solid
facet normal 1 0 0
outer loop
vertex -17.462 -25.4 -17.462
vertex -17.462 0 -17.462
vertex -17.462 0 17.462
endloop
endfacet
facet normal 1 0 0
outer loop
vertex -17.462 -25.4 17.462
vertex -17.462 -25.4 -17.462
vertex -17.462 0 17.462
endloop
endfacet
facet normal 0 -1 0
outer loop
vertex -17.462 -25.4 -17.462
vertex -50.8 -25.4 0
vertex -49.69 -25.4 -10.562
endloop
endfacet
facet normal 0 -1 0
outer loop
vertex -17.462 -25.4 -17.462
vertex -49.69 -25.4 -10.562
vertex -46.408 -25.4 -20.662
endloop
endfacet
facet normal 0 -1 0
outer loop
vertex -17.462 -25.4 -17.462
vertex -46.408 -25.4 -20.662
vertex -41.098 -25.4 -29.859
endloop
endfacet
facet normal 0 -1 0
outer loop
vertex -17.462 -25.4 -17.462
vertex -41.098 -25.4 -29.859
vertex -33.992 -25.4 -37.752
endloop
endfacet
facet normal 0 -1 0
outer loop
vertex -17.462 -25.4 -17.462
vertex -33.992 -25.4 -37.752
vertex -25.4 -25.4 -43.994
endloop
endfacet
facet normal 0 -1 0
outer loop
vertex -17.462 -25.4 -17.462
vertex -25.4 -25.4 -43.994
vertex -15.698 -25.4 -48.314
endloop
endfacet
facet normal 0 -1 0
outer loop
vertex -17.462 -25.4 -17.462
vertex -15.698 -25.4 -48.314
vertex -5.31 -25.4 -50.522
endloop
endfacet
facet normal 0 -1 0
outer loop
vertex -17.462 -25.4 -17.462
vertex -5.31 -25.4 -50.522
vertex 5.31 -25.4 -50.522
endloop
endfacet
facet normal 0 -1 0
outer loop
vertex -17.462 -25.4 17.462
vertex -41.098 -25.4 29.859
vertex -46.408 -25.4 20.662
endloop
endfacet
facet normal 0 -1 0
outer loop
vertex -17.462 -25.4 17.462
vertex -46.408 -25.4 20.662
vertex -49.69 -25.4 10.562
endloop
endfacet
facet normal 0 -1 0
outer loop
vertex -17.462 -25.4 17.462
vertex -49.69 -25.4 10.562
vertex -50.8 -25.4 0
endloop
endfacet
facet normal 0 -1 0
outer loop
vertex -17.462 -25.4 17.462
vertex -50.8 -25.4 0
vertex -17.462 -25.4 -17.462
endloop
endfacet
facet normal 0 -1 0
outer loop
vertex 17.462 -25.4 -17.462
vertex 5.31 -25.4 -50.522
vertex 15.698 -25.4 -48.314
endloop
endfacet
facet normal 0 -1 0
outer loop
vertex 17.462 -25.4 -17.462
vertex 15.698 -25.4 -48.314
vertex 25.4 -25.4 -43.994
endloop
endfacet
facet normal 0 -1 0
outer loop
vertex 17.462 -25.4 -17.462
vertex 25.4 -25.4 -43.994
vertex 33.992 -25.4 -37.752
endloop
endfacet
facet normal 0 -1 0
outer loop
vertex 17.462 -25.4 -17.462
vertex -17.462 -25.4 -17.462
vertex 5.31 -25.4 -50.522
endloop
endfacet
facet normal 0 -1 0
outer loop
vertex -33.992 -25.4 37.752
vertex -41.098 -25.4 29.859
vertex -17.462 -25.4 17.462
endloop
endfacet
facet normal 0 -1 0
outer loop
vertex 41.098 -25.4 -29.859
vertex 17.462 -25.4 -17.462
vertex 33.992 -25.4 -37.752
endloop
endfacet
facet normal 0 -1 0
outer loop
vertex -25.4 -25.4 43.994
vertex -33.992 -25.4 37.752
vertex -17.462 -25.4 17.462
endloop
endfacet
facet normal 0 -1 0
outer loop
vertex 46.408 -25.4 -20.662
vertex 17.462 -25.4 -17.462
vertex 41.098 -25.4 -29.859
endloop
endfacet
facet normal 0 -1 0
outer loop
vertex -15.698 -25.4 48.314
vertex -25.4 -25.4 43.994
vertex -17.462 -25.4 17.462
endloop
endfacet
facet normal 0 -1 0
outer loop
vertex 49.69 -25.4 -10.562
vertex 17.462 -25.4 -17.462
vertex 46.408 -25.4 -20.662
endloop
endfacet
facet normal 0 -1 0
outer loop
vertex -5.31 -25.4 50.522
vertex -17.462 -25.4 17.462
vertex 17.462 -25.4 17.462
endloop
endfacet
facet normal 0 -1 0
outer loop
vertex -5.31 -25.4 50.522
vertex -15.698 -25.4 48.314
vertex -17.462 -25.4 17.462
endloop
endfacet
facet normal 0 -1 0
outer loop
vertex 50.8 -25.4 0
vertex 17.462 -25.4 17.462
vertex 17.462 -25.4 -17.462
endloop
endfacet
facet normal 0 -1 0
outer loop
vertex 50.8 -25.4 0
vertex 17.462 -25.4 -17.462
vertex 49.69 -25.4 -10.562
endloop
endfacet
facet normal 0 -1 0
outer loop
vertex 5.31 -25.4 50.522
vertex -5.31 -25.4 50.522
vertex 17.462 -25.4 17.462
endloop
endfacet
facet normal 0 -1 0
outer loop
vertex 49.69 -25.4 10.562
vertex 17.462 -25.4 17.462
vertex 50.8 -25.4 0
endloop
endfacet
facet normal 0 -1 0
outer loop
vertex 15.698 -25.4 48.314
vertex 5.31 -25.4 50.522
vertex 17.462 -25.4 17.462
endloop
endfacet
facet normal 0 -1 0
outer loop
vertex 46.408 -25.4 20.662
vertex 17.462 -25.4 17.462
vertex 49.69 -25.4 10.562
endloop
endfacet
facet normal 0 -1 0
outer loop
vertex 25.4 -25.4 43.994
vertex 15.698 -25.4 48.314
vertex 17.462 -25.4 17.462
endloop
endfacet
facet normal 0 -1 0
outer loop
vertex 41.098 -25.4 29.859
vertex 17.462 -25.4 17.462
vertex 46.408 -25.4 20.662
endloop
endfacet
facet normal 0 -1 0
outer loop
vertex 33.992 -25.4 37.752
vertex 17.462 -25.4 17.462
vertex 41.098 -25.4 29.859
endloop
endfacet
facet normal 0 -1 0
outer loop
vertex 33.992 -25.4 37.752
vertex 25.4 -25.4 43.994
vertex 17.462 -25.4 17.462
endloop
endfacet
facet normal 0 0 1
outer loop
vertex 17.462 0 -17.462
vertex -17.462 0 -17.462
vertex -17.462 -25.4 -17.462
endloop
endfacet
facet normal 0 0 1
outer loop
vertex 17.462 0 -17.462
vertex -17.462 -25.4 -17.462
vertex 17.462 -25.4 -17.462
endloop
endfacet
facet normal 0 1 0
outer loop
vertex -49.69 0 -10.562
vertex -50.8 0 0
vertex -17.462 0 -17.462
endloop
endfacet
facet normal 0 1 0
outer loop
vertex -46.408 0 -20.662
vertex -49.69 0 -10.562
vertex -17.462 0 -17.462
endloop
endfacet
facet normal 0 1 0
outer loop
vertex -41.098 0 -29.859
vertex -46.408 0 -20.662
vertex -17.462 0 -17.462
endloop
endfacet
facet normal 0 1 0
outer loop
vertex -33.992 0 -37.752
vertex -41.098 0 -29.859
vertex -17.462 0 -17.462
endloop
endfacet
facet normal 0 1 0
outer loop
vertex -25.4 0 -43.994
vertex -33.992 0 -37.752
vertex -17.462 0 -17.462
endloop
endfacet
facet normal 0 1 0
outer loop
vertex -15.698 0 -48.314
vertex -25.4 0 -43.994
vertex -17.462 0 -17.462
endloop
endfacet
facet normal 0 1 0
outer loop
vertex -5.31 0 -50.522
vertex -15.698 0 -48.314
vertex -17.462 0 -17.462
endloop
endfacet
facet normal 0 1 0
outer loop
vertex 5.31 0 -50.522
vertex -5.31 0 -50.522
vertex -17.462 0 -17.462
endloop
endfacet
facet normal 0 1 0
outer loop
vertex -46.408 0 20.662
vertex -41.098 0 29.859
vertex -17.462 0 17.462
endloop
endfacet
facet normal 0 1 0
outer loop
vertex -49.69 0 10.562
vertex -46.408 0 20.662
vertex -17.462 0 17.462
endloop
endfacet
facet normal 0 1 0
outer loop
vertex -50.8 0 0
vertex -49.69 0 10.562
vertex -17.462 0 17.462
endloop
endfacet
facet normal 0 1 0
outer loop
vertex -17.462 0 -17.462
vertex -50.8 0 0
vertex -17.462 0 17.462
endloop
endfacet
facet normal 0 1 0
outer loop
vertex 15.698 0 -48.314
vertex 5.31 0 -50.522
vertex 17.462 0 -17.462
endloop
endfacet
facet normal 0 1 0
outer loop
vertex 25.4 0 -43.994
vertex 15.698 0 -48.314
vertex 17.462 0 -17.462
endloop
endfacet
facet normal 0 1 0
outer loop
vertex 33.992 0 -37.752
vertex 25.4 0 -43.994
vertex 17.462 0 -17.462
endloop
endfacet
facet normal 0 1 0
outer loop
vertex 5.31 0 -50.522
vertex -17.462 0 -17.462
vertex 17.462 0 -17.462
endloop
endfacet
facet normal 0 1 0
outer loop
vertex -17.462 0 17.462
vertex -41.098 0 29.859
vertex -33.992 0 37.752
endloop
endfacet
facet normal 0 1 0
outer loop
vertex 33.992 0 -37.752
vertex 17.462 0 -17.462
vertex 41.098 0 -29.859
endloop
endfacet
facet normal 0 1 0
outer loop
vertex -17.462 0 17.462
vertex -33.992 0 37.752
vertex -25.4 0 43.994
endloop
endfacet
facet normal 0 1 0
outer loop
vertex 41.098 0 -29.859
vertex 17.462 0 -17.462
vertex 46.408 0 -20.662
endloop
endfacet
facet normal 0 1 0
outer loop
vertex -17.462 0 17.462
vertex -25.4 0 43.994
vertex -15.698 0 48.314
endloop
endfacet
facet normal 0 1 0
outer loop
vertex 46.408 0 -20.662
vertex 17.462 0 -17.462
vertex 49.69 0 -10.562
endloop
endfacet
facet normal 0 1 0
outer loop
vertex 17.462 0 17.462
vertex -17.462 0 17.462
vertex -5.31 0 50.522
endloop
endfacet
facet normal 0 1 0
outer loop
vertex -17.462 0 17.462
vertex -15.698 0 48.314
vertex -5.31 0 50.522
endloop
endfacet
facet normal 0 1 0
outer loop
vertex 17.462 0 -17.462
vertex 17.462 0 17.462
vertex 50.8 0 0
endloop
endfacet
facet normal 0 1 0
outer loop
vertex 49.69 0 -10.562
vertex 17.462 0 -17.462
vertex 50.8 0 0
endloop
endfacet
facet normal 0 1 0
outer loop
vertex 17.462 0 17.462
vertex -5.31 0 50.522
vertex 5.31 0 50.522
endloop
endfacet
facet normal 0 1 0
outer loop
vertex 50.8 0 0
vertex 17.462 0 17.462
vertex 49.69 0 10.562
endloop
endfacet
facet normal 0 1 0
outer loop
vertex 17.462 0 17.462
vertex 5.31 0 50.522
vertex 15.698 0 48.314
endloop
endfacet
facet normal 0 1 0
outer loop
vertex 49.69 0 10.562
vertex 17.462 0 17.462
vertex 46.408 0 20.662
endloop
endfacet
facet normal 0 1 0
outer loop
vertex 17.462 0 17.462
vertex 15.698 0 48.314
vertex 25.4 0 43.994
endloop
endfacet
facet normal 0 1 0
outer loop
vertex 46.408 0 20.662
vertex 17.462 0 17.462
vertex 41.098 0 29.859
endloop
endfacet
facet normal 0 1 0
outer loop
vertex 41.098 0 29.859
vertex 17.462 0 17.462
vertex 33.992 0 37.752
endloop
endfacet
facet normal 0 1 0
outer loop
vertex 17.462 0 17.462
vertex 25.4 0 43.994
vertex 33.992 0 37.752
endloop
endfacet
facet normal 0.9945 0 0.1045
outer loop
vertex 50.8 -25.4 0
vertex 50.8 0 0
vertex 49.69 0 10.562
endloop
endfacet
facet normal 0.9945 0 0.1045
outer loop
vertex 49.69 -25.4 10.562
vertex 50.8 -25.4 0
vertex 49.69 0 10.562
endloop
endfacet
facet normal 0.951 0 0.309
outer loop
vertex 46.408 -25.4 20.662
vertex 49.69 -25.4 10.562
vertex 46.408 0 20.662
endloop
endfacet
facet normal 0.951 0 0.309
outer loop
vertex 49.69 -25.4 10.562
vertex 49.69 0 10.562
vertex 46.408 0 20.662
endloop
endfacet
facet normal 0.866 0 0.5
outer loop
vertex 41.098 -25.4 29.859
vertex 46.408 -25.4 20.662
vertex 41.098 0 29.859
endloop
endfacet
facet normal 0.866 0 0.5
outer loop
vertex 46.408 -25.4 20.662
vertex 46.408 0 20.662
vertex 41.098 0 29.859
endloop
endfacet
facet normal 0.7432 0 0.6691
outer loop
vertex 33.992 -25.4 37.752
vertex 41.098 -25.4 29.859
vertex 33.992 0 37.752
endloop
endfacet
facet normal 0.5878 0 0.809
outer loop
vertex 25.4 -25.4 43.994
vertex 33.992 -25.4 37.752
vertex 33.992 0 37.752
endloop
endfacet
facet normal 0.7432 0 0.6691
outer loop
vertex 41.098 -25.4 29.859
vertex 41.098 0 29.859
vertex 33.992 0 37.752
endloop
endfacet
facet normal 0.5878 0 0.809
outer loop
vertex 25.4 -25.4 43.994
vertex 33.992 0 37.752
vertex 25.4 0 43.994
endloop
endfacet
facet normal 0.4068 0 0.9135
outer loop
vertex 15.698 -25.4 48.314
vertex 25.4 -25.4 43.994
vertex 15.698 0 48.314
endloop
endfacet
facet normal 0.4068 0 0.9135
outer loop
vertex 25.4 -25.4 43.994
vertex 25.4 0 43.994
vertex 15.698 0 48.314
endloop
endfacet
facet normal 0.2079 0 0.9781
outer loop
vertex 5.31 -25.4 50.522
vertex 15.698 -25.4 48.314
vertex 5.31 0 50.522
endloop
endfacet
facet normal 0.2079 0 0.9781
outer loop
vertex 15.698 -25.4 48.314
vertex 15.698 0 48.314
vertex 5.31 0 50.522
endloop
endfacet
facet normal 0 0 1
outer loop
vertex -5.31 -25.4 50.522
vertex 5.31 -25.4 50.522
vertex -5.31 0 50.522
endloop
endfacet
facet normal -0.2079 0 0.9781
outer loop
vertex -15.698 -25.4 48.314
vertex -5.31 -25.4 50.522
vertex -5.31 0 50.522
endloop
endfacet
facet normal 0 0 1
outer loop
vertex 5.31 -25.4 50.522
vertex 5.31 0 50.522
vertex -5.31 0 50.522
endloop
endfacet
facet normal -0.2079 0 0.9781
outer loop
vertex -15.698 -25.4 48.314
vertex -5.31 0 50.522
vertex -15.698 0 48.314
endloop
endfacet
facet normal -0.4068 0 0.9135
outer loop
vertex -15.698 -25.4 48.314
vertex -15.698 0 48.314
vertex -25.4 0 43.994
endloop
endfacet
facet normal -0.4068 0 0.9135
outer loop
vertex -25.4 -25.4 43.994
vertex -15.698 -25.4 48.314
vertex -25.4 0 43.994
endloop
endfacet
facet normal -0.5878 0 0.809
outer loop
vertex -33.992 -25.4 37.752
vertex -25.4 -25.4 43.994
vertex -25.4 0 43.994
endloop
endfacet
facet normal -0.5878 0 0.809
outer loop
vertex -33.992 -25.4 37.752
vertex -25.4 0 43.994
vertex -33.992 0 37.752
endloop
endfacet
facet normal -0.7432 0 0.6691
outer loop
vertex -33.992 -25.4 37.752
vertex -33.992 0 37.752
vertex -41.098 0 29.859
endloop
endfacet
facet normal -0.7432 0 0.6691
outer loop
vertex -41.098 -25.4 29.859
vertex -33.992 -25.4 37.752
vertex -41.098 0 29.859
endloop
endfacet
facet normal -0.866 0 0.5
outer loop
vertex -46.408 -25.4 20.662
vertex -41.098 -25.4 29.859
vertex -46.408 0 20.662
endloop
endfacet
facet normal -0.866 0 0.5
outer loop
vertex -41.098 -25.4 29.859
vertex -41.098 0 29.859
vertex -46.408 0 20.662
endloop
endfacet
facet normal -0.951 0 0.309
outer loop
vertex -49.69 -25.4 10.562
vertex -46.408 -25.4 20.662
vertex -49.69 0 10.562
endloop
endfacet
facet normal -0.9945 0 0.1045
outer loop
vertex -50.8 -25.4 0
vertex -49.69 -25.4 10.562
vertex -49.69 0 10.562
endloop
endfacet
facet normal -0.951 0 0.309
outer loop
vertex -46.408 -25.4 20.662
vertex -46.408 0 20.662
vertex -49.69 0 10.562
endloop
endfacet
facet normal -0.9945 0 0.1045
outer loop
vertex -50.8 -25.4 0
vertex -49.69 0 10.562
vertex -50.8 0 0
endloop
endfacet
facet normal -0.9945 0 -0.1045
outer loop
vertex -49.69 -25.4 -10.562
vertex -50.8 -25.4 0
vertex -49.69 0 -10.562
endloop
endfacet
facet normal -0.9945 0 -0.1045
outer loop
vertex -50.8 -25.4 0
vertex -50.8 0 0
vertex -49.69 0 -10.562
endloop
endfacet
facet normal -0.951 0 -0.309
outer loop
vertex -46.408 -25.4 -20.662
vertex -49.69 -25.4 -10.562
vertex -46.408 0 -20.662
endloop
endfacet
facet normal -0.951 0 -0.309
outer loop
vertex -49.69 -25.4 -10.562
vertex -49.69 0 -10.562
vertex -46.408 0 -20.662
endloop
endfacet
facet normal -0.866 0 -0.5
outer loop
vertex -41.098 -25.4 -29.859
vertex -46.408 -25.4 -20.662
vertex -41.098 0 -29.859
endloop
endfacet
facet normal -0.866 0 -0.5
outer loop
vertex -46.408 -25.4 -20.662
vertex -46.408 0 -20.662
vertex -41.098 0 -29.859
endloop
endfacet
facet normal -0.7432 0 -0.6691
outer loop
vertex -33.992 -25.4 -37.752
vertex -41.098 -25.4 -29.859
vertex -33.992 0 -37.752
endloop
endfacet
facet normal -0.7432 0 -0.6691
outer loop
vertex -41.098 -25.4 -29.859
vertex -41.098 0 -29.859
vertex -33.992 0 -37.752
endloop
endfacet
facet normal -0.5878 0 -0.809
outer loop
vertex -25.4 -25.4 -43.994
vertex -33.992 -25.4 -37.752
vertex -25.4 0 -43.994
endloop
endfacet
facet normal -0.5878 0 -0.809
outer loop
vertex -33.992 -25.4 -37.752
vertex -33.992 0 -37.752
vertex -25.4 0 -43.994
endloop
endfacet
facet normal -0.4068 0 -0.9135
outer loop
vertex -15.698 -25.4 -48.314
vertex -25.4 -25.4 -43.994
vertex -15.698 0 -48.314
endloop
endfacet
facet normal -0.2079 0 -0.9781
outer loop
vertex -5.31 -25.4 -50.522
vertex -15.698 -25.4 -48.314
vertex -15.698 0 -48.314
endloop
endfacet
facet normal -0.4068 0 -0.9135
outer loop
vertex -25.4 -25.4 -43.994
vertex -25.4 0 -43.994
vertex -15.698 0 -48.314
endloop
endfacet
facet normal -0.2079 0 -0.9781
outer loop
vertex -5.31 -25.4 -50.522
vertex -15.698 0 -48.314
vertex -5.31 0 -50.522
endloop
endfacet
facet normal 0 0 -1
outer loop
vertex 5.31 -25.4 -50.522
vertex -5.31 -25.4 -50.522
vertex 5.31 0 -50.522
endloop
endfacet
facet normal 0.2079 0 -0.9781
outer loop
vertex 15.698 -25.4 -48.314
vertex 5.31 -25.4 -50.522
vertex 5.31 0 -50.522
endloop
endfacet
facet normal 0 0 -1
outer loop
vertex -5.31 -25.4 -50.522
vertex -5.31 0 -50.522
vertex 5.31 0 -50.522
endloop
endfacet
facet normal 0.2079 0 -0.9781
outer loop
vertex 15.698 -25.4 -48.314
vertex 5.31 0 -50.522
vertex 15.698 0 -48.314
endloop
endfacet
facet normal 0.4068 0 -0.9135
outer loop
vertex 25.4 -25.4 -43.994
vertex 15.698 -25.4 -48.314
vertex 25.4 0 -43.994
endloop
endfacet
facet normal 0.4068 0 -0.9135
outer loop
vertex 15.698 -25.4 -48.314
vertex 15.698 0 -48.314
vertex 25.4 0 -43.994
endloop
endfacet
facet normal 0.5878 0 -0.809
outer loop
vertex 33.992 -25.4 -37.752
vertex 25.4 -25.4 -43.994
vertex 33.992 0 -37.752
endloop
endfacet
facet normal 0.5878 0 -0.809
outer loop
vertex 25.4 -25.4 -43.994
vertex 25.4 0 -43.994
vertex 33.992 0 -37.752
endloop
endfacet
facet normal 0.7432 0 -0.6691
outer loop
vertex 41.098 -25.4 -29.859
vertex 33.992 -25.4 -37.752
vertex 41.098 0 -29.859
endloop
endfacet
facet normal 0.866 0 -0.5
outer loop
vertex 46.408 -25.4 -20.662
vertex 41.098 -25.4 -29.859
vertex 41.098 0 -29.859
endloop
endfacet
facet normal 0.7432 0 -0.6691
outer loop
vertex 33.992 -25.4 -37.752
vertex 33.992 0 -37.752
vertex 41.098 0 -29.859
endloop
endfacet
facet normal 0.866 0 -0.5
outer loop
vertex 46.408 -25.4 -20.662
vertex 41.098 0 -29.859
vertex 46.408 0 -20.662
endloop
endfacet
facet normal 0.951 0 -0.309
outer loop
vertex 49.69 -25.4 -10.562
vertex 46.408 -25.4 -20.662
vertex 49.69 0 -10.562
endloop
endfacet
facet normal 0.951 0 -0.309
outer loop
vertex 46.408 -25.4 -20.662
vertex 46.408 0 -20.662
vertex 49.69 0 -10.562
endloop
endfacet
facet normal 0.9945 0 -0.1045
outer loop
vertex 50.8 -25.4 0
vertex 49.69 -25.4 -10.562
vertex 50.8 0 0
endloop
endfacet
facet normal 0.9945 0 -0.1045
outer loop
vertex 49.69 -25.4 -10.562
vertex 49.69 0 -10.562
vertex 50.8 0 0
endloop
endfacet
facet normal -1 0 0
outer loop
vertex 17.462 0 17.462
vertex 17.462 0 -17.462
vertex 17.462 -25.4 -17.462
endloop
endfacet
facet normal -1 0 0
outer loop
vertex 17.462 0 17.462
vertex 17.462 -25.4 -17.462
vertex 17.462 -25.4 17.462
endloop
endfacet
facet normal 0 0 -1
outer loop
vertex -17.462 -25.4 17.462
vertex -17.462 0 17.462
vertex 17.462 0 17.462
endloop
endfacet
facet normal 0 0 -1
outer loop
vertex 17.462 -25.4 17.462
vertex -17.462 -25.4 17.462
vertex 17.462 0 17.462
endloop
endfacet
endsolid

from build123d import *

# Parameters (mm, degrees)
F0_R     = 50.8
F0_W     = 34.925
F0_H     = 34.925
F1_DEPTH = 25.4


with BuildPart() as f1:
    # F0 (on Front) → F1 (new body)
    with BuildSketch(Plane.XZ):
        Circle(F0_R)
        Rectangle(F0_W, F0_H, mode=Mode.SUBTRACT)
    extrude(amount=F1_DEPTH)


solid = f1.part
